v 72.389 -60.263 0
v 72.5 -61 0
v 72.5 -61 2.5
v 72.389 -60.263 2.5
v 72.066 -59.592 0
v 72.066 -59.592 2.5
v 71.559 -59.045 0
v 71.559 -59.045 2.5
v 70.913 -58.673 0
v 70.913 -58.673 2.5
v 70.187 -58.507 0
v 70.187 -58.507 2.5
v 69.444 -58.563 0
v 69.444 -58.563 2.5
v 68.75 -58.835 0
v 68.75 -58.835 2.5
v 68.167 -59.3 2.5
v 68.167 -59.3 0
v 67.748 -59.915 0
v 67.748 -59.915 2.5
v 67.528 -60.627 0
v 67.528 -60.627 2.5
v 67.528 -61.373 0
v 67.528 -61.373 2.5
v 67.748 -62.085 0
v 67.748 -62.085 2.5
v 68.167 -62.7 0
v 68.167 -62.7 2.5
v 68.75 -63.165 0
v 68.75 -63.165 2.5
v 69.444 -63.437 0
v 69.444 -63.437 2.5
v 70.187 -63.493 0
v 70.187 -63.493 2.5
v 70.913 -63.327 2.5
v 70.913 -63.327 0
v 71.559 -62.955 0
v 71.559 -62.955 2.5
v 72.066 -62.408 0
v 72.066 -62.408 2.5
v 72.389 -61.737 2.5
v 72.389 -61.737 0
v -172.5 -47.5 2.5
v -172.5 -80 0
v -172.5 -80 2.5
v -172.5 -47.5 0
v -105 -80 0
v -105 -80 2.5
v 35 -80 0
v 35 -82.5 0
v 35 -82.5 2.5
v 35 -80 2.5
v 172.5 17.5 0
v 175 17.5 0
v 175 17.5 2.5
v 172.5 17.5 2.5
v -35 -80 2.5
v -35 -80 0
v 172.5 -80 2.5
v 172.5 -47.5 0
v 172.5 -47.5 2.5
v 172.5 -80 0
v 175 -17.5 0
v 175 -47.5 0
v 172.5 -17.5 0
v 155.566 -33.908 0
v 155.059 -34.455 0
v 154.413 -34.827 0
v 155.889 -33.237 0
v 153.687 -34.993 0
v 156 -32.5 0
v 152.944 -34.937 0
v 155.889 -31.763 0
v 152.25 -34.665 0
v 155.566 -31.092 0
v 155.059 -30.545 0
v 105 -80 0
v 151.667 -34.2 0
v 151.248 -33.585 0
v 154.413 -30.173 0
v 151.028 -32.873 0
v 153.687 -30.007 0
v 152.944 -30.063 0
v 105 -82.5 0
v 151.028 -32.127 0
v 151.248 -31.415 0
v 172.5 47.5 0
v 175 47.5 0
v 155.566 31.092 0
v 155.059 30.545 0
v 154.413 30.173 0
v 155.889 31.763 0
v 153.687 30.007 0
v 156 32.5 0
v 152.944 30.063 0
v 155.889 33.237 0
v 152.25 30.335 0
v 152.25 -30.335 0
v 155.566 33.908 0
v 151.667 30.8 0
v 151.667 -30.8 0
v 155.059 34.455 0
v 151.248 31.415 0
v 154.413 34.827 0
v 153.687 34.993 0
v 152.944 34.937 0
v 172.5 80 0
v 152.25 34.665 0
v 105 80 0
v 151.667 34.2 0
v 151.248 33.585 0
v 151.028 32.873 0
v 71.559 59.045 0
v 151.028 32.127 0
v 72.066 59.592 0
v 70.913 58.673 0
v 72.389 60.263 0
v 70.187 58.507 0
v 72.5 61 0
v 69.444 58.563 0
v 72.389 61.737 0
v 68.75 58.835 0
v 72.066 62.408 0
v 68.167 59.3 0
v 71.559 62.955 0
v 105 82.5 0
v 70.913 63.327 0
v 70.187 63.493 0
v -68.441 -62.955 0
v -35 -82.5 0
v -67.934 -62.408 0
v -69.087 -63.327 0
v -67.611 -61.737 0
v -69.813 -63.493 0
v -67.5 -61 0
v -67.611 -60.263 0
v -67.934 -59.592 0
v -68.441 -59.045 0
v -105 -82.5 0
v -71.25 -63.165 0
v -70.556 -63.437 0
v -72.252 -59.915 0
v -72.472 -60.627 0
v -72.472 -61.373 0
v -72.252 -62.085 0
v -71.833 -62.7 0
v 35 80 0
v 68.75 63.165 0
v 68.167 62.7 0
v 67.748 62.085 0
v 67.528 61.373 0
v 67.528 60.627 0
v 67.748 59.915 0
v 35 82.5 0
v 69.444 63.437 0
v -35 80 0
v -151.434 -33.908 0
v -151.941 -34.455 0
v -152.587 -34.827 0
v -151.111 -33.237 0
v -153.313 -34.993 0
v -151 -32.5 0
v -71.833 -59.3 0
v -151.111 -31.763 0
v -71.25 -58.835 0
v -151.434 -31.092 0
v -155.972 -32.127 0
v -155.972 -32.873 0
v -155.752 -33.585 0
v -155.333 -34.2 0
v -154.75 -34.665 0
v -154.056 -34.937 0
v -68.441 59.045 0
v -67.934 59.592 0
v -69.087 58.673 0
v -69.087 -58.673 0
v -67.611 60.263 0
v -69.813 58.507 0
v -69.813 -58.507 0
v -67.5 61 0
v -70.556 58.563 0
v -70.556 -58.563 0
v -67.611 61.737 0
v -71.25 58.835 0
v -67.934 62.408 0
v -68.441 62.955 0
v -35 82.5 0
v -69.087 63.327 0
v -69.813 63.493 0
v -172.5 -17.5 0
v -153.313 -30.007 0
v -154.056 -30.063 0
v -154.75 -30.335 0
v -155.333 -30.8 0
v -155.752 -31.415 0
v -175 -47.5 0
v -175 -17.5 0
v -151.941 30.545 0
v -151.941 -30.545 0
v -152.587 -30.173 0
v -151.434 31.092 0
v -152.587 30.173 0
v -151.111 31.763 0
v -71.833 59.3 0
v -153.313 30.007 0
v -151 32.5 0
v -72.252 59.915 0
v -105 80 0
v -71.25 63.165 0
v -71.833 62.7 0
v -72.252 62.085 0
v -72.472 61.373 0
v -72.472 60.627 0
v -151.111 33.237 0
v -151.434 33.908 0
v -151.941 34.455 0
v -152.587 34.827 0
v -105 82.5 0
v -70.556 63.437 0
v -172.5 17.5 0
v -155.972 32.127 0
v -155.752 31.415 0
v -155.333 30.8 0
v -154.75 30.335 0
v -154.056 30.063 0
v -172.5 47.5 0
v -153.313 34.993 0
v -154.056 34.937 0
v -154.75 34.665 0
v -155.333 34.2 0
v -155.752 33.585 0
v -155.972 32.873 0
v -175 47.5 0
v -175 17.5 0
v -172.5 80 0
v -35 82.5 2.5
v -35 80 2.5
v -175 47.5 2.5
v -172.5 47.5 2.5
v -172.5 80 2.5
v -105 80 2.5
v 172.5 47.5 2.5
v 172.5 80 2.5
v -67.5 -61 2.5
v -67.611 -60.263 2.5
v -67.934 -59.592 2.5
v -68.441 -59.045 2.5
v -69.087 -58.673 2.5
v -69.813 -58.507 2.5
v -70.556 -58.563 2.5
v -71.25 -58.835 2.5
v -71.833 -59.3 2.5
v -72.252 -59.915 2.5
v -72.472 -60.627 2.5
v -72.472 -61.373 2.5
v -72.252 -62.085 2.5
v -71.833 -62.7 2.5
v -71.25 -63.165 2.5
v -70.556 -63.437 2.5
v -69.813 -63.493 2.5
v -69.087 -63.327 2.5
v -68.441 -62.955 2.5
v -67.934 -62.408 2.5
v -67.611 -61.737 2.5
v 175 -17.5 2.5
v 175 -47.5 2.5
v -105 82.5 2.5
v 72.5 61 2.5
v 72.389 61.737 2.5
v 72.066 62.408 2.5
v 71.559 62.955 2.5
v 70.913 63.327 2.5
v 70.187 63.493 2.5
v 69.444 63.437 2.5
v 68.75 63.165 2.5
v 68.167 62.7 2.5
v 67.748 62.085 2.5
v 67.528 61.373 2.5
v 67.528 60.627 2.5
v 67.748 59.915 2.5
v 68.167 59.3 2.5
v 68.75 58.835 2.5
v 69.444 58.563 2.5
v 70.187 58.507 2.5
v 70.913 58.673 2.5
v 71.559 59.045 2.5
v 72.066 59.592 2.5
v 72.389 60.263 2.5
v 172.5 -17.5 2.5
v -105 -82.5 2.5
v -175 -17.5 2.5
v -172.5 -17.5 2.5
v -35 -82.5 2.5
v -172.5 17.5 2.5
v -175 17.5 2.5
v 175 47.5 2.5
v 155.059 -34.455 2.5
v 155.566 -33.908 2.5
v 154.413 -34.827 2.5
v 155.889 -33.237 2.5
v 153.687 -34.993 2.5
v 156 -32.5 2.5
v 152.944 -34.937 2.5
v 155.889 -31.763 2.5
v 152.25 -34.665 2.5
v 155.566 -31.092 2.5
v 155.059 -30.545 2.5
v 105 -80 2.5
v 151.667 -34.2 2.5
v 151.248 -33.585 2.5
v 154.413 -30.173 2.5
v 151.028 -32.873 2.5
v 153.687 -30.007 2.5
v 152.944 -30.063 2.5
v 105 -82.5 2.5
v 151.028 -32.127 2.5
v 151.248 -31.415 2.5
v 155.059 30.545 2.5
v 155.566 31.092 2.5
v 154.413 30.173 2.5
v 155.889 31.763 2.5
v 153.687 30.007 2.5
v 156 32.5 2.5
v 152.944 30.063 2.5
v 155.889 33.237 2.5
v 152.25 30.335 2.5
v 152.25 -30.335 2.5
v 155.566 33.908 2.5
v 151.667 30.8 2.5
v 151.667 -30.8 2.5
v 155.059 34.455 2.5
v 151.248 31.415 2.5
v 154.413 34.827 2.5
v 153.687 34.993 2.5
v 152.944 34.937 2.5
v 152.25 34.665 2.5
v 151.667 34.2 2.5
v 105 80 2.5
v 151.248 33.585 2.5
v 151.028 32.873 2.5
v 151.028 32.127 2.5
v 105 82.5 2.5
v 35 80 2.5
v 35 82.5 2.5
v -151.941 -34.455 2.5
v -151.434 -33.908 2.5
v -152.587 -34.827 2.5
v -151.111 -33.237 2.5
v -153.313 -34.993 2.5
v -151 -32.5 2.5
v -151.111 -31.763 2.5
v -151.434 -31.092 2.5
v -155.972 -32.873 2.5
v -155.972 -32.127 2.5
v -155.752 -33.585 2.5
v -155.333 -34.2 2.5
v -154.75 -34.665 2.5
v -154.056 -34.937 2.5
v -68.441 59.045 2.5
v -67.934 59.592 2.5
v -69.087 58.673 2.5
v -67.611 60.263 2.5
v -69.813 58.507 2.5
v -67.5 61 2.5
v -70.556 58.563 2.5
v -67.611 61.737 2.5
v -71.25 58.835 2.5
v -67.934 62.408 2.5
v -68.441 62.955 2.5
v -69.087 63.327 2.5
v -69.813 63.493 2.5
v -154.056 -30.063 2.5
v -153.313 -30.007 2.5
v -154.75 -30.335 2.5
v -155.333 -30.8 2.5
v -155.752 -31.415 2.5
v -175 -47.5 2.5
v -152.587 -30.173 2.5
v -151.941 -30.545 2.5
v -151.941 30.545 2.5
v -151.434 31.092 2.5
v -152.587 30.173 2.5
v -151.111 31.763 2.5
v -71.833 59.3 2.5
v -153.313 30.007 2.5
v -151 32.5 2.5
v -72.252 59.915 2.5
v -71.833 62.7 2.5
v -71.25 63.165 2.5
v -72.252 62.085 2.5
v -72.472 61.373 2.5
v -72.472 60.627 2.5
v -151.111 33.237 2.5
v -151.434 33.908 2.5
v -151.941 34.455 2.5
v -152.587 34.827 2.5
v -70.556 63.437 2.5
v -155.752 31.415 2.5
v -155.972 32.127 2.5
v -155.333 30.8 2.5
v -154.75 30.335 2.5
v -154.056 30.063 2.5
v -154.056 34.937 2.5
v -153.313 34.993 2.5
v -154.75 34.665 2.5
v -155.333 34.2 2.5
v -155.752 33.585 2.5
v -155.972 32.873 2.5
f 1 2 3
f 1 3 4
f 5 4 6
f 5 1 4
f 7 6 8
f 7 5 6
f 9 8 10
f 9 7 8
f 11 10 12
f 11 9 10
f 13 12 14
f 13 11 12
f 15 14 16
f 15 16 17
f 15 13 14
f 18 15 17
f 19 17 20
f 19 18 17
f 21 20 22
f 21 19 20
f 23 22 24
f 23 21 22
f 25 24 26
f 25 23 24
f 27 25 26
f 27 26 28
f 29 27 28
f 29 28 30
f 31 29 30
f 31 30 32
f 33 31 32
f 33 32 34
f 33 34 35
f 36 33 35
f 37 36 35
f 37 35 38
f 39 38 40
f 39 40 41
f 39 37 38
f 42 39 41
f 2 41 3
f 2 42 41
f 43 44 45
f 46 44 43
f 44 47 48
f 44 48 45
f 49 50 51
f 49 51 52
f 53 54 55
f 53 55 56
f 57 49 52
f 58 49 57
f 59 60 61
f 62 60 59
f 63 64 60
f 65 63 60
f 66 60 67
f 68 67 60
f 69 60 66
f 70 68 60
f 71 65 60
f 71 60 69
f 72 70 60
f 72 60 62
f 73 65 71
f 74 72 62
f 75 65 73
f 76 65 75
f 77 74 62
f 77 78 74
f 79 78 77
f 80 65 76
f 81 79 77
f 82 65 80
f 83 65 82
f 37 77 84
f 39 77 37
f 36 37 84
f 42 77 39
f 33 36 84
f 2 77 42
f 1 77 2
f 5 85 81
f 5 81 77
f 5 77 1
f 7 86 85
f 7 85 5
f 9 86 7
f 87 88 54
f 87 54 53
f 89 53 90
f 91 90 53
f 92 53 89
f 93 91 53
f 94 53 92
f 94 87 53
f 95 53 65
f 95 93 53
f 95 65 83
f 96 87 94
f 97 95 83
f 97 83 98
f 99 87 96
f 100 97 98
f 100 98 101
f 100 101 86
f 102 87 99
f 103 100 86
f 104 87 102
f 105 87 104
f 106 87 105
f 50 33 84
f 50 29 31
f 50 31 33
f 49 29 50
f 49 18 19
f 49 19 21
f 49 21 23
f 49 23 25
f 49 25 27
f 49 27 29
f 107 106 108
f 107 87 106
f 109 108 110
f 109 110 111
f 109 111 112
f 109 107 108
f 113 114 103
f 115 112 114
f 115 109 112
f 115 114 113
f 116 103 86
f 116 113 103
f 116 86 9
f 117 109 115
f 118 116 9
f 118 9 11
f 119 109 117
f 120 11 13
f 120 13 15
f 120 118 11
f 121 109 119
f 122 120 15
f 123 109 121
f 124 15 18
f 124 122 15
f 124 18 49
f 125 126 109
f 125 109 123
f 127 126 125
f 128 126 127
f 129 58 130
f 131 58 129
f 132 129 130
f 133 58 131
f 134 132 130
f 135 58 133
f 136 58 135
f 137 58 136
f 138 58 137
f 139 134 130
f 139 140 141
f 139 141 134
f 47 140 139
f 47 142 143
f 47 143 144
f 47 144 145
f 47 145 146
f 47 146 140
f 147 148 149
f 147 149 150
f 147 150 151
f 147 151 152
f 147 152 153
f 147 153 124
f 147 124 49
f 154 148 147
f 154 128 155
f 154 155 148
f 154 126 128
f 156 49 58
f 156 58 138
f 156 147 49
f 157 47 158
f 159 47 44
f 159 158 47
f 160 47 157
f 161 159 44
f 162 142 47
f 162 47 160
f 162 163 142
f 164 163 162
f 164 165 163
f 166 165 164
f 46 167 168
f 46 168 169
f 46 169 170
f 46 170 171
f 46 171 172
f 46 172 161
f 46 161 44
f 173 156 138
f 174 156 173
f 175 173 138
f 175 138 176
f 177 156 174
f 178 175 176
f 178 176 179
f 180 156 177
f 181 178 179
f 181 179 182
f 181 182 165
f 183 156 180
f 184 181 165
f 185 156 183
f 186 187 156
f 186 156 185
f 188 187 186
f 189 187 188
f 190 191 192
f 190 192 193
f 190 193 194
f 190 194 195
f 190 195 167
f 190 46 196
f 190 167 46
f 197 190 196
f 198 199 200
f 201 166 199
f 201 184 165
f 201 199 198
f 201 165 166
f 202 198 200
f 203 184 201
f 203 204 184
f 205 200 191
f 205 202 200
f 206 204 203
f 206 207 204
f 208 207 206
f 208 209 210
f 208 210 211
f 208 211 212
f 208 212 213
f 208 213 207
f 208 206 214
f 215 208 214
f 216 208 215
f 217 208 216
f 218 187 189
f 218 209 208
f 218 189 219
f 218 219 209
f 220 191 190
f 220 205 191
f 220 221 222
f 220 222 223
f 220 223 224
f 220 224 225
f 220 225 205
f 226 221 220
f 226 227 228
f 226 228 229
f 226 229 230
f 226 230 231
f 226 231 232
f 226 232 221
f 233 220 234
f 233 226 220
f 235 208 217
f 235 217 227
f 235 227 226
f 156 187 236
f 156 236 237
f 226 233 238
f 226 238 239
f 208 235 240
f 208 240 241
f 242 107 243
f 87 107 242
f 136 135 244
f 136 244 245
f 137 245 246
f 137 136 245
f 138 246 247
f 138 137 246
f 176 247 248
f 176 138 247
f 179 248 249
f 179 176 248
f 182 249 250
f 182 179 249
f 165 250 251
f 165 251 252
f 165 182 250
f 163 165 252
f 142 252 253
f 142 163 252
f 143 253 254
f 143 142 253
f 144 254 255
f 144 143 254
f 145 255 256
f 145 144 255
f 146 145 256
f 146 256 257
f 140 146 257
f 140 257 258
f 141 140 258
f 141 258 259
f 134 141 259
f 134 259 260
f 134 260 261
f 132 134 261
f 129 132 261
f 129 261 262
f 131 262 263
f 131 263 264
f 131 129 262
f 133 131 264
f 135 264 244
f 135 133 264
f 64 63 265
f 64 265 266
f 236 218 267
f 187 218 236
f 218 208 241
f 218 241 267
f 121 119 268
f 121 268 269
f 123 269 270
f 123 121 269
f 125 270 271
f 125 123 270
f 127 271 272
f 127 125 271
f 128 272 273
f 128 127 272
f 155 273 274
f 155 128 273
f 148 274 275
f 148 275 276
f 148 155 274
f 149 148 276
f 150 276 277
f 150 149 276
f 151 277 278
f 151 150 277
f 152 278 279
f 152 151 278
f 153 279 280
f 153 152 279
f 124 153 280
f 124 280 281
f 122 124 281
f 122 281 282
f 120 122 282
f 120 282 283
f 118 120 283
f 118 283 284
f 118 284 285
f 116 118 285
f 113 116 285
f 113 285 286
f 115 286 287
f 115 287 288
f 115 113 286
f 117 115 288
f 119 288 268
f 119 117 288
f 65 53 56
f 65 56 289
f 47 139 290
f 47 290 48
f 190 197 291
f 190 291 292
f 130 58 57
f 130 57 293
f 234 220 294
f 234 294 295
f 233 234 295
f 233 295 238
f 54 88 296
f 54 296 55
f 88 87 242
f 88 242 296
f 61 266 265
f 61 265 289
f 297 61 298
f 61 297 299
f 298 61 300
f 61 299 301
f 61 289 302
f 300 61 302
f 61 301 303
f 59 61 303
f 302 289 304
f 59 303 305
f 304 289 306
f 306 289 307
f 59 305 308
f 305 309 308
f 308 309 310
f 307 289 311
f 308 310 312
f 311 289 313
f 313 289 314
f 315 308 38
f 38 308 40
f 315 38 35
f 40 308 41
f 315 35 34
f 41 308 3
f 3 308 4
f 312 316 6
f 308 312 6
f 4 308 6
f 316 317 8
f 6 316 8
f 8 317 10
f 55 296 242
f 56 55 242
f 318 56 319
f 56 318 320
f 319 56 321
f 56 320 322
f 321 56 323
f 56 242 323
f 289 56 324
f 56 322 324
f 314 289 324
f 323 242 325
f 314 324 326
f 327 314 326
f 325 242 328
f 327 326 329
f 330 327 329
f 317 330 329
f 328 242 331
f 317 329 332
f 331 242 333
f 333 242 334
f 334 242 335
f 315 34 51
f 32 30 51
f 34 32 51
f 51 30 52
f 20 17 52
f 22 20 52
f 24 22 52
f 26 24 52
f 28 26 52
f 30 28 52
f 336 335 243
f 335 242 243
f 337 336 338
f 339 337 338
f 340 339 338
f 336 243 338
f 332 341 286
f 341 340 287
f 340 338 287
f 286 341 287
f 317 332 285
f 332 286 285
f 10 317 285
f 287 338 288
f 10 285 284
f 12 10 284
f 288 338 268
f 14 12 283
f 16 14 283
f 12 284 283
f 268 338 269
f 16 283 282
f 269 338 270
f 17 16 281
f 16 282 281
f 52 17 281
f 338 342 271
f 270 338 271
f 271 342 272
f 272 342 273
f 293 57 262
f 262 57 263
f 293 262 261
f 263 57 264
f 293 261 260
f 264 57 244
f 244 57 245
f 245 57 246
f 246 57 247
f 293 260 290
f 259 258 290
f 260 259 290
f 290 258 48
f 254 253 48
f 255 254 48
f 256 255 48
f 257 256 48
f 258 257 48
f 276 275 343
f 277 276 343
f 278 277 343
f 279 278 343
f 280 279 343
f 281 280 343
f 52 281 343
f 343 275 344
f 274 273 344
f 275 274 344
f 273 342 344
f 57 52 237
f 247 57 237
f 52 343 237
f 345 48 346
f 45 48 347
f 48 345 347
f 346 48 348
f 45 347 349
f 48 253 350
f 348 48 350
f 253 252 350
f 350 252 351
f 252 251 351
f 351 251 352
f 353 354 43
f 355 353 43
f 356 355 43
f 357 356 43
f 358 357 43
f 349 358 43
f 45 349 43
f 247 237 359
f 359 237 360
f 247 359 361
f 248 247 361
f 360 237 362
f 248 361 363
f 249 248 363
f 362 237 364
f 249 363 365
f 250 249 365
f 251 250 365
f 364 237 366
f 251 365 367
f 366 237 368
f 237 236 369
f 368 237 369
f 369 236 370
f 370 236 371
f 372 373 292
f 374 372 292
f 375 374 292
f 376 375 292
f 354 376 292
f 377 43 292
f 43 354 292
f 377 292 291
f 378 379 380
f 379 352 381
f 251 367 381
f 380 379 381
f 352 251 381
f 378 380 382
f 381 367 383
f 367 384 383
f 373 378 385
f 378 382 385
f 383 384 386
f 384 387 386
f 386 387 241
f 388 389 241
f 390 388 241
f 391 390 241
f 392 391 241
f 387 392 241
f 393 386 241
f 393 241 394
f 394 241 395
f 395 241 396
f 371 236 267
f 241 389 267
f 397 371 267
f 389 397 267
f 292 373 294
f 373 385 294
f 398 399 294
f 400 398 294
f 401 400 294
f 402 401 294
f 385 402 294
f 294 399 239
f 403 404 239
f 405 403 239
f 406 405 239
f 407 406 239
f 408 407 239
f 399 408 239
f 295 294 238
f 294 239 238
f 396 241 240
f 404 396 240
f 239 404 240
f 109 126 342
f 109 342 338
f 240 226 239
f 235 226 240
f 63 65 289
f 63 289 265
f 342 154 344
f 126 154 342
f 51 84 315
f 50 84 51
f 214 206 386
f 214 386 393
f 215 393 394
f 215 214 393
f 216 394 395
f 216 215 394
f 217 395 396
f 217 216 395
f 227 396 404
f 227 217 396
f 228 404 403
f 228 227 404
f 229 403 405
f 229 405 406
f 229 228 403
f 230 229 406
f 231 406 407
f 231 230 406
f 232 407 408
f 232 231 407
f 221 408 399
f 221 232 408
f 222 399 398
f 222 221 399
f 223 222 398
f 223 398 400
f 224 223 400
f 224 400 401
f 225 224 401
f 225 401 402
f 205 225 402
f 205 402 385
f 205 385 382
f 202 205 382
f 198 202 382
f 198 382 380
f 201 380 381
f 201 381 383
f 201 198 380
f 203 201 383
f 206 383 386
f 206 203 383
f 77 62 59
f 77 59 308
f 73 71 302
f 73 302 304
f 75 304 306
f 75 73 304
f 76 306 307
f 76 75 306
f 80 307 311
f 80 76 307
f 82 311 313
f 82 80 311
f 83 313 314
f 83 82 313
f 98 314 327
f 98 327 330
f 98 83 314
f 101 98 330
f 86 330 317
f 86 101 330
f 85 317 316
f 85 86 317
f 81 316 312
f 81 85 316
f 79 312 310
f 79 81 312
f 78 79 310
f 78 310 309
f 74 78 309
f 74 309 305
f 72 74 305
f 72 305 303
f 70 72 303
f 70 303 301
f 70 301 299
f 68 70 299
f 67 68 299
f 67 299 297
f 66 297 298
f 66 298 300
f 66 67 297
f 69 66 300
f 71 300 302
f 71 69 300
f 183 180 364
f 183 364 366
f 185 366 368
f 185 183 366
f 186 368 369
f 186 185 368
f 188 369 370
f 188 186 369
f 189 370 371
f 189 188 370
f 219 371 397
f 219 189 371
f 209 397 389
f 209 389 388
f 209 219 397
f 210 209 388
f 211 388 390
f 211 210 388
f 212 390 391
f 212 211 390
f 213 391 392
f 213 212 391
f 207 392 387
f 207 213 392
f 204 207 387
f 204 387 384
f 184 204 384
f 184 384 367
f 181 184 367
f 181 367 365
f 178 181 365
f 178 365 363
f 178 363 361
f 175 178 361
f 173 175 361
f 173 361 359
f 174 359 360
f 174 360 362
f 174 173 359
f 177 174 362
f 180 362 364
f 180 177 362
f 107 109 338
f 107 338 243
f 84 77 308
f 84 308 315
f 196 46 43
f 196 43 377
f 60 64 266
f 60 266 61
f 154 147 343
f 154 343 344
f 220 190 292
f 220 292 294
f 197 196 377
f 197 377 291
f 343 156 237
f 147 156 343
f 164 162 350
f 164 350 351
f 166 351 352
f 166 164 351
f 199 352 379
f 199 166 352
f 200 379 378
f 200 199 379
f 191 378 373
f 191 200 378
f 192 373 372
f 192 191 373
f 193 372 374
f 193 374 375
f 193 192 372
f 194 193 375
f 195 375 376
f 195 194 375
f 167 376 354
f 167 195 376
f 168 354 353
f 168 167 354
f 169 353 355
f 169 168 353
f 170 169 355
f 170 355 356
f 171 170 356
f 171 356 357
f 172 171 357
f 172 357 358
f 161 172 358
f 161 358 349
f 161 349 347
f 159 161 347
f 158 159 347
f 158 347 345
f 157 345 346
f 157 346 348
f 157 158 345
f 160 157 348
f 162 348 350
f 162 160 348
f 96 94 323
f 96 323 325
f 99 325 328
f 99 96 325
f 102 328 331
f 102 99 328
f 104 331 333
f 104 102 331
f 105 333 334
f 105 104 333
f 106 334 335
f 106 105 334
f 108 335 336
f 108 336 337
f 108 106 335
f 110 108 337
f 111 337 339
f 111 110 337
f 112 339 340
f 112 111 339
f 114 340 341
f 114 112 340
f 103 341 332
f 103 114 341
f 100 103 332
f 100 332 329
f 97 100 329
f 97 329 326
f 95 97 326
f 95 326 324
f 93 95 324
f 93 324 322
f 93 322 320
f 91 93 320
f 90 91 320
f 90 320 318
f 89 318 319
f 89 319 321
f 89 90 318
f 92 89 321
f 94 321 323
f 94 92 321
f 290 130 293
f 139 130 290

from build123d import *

# Parameters (mm, degrees)
SKETCH1_R           = 2.5
BOSS_EXTRUDE1_DEPTH = 2.5


with BuildPart() as part:
    # Sketch1 → Boss-Extrude1 (new body)
    with BuildSketch(Plane.XY):
        Polygon((-172.5, 80), (-105, 80), (-105, 82.5), (-35, 82.5), (-35, 80), (35, 80), (35, 82.5), (105, 82.5), (105, 80), (172.5, 80), (172.5, 47.5), (175, 47.5), (175, 17.5), (172.5, 17.5), (172.5, -17.5), (175, -17.5), (175, -47.5), (172.5, -47.5), (172.5, -80), (105, -80), (105, -82.5), (35, -82.5), (35, -80), (-35, -80), (-35, -82.5), (-105, -82.5), (-105, -80), (-172.5, -80), (-172.5, -47.5), (-175, -47.5), (-175, -17.5), (-172.5, -17.5), (-172.5, 17.5), (-175, 17.5), (-175, 47.5), (-172.5, 47.5), align=None)
        with Locations((-70, -61)):
            Circle(SKETCH1_R, mode=Mode.SUBTRACT)
        with Locations((70, -61)):
            Circle(SKETCH1_R, mode=Mode.SUBTRACT)
        with Locations((70, 61)):
            Circle(SKETCH1_R, mode=Mode.SUBTRACT)
        with Locations((-70, 61)):
            Circle(SKETCH1_R, mode=Mode.SUBTRACT)
        with Locations((153.5, -32.5)):
            Circle(SKETCH1_R, mode=Mode.SUBTRACT)
        with Locations((153.5, 32.5)):
            Circle(SKETCH1_R, mode=Mode.SUBTRACT)
        with Locations((-153.5, -32.5)):
            Circle(SKETCH1_R, mode=Mode.SUBTRACT)
        with Locations((-153.5, 32.5)):
            Circle(SKETCH1_R, mode=Mode.SUBTRACT)
    extrude(amount=BOSS_EXTRUDE1_DEPTH)


solid = part.part
